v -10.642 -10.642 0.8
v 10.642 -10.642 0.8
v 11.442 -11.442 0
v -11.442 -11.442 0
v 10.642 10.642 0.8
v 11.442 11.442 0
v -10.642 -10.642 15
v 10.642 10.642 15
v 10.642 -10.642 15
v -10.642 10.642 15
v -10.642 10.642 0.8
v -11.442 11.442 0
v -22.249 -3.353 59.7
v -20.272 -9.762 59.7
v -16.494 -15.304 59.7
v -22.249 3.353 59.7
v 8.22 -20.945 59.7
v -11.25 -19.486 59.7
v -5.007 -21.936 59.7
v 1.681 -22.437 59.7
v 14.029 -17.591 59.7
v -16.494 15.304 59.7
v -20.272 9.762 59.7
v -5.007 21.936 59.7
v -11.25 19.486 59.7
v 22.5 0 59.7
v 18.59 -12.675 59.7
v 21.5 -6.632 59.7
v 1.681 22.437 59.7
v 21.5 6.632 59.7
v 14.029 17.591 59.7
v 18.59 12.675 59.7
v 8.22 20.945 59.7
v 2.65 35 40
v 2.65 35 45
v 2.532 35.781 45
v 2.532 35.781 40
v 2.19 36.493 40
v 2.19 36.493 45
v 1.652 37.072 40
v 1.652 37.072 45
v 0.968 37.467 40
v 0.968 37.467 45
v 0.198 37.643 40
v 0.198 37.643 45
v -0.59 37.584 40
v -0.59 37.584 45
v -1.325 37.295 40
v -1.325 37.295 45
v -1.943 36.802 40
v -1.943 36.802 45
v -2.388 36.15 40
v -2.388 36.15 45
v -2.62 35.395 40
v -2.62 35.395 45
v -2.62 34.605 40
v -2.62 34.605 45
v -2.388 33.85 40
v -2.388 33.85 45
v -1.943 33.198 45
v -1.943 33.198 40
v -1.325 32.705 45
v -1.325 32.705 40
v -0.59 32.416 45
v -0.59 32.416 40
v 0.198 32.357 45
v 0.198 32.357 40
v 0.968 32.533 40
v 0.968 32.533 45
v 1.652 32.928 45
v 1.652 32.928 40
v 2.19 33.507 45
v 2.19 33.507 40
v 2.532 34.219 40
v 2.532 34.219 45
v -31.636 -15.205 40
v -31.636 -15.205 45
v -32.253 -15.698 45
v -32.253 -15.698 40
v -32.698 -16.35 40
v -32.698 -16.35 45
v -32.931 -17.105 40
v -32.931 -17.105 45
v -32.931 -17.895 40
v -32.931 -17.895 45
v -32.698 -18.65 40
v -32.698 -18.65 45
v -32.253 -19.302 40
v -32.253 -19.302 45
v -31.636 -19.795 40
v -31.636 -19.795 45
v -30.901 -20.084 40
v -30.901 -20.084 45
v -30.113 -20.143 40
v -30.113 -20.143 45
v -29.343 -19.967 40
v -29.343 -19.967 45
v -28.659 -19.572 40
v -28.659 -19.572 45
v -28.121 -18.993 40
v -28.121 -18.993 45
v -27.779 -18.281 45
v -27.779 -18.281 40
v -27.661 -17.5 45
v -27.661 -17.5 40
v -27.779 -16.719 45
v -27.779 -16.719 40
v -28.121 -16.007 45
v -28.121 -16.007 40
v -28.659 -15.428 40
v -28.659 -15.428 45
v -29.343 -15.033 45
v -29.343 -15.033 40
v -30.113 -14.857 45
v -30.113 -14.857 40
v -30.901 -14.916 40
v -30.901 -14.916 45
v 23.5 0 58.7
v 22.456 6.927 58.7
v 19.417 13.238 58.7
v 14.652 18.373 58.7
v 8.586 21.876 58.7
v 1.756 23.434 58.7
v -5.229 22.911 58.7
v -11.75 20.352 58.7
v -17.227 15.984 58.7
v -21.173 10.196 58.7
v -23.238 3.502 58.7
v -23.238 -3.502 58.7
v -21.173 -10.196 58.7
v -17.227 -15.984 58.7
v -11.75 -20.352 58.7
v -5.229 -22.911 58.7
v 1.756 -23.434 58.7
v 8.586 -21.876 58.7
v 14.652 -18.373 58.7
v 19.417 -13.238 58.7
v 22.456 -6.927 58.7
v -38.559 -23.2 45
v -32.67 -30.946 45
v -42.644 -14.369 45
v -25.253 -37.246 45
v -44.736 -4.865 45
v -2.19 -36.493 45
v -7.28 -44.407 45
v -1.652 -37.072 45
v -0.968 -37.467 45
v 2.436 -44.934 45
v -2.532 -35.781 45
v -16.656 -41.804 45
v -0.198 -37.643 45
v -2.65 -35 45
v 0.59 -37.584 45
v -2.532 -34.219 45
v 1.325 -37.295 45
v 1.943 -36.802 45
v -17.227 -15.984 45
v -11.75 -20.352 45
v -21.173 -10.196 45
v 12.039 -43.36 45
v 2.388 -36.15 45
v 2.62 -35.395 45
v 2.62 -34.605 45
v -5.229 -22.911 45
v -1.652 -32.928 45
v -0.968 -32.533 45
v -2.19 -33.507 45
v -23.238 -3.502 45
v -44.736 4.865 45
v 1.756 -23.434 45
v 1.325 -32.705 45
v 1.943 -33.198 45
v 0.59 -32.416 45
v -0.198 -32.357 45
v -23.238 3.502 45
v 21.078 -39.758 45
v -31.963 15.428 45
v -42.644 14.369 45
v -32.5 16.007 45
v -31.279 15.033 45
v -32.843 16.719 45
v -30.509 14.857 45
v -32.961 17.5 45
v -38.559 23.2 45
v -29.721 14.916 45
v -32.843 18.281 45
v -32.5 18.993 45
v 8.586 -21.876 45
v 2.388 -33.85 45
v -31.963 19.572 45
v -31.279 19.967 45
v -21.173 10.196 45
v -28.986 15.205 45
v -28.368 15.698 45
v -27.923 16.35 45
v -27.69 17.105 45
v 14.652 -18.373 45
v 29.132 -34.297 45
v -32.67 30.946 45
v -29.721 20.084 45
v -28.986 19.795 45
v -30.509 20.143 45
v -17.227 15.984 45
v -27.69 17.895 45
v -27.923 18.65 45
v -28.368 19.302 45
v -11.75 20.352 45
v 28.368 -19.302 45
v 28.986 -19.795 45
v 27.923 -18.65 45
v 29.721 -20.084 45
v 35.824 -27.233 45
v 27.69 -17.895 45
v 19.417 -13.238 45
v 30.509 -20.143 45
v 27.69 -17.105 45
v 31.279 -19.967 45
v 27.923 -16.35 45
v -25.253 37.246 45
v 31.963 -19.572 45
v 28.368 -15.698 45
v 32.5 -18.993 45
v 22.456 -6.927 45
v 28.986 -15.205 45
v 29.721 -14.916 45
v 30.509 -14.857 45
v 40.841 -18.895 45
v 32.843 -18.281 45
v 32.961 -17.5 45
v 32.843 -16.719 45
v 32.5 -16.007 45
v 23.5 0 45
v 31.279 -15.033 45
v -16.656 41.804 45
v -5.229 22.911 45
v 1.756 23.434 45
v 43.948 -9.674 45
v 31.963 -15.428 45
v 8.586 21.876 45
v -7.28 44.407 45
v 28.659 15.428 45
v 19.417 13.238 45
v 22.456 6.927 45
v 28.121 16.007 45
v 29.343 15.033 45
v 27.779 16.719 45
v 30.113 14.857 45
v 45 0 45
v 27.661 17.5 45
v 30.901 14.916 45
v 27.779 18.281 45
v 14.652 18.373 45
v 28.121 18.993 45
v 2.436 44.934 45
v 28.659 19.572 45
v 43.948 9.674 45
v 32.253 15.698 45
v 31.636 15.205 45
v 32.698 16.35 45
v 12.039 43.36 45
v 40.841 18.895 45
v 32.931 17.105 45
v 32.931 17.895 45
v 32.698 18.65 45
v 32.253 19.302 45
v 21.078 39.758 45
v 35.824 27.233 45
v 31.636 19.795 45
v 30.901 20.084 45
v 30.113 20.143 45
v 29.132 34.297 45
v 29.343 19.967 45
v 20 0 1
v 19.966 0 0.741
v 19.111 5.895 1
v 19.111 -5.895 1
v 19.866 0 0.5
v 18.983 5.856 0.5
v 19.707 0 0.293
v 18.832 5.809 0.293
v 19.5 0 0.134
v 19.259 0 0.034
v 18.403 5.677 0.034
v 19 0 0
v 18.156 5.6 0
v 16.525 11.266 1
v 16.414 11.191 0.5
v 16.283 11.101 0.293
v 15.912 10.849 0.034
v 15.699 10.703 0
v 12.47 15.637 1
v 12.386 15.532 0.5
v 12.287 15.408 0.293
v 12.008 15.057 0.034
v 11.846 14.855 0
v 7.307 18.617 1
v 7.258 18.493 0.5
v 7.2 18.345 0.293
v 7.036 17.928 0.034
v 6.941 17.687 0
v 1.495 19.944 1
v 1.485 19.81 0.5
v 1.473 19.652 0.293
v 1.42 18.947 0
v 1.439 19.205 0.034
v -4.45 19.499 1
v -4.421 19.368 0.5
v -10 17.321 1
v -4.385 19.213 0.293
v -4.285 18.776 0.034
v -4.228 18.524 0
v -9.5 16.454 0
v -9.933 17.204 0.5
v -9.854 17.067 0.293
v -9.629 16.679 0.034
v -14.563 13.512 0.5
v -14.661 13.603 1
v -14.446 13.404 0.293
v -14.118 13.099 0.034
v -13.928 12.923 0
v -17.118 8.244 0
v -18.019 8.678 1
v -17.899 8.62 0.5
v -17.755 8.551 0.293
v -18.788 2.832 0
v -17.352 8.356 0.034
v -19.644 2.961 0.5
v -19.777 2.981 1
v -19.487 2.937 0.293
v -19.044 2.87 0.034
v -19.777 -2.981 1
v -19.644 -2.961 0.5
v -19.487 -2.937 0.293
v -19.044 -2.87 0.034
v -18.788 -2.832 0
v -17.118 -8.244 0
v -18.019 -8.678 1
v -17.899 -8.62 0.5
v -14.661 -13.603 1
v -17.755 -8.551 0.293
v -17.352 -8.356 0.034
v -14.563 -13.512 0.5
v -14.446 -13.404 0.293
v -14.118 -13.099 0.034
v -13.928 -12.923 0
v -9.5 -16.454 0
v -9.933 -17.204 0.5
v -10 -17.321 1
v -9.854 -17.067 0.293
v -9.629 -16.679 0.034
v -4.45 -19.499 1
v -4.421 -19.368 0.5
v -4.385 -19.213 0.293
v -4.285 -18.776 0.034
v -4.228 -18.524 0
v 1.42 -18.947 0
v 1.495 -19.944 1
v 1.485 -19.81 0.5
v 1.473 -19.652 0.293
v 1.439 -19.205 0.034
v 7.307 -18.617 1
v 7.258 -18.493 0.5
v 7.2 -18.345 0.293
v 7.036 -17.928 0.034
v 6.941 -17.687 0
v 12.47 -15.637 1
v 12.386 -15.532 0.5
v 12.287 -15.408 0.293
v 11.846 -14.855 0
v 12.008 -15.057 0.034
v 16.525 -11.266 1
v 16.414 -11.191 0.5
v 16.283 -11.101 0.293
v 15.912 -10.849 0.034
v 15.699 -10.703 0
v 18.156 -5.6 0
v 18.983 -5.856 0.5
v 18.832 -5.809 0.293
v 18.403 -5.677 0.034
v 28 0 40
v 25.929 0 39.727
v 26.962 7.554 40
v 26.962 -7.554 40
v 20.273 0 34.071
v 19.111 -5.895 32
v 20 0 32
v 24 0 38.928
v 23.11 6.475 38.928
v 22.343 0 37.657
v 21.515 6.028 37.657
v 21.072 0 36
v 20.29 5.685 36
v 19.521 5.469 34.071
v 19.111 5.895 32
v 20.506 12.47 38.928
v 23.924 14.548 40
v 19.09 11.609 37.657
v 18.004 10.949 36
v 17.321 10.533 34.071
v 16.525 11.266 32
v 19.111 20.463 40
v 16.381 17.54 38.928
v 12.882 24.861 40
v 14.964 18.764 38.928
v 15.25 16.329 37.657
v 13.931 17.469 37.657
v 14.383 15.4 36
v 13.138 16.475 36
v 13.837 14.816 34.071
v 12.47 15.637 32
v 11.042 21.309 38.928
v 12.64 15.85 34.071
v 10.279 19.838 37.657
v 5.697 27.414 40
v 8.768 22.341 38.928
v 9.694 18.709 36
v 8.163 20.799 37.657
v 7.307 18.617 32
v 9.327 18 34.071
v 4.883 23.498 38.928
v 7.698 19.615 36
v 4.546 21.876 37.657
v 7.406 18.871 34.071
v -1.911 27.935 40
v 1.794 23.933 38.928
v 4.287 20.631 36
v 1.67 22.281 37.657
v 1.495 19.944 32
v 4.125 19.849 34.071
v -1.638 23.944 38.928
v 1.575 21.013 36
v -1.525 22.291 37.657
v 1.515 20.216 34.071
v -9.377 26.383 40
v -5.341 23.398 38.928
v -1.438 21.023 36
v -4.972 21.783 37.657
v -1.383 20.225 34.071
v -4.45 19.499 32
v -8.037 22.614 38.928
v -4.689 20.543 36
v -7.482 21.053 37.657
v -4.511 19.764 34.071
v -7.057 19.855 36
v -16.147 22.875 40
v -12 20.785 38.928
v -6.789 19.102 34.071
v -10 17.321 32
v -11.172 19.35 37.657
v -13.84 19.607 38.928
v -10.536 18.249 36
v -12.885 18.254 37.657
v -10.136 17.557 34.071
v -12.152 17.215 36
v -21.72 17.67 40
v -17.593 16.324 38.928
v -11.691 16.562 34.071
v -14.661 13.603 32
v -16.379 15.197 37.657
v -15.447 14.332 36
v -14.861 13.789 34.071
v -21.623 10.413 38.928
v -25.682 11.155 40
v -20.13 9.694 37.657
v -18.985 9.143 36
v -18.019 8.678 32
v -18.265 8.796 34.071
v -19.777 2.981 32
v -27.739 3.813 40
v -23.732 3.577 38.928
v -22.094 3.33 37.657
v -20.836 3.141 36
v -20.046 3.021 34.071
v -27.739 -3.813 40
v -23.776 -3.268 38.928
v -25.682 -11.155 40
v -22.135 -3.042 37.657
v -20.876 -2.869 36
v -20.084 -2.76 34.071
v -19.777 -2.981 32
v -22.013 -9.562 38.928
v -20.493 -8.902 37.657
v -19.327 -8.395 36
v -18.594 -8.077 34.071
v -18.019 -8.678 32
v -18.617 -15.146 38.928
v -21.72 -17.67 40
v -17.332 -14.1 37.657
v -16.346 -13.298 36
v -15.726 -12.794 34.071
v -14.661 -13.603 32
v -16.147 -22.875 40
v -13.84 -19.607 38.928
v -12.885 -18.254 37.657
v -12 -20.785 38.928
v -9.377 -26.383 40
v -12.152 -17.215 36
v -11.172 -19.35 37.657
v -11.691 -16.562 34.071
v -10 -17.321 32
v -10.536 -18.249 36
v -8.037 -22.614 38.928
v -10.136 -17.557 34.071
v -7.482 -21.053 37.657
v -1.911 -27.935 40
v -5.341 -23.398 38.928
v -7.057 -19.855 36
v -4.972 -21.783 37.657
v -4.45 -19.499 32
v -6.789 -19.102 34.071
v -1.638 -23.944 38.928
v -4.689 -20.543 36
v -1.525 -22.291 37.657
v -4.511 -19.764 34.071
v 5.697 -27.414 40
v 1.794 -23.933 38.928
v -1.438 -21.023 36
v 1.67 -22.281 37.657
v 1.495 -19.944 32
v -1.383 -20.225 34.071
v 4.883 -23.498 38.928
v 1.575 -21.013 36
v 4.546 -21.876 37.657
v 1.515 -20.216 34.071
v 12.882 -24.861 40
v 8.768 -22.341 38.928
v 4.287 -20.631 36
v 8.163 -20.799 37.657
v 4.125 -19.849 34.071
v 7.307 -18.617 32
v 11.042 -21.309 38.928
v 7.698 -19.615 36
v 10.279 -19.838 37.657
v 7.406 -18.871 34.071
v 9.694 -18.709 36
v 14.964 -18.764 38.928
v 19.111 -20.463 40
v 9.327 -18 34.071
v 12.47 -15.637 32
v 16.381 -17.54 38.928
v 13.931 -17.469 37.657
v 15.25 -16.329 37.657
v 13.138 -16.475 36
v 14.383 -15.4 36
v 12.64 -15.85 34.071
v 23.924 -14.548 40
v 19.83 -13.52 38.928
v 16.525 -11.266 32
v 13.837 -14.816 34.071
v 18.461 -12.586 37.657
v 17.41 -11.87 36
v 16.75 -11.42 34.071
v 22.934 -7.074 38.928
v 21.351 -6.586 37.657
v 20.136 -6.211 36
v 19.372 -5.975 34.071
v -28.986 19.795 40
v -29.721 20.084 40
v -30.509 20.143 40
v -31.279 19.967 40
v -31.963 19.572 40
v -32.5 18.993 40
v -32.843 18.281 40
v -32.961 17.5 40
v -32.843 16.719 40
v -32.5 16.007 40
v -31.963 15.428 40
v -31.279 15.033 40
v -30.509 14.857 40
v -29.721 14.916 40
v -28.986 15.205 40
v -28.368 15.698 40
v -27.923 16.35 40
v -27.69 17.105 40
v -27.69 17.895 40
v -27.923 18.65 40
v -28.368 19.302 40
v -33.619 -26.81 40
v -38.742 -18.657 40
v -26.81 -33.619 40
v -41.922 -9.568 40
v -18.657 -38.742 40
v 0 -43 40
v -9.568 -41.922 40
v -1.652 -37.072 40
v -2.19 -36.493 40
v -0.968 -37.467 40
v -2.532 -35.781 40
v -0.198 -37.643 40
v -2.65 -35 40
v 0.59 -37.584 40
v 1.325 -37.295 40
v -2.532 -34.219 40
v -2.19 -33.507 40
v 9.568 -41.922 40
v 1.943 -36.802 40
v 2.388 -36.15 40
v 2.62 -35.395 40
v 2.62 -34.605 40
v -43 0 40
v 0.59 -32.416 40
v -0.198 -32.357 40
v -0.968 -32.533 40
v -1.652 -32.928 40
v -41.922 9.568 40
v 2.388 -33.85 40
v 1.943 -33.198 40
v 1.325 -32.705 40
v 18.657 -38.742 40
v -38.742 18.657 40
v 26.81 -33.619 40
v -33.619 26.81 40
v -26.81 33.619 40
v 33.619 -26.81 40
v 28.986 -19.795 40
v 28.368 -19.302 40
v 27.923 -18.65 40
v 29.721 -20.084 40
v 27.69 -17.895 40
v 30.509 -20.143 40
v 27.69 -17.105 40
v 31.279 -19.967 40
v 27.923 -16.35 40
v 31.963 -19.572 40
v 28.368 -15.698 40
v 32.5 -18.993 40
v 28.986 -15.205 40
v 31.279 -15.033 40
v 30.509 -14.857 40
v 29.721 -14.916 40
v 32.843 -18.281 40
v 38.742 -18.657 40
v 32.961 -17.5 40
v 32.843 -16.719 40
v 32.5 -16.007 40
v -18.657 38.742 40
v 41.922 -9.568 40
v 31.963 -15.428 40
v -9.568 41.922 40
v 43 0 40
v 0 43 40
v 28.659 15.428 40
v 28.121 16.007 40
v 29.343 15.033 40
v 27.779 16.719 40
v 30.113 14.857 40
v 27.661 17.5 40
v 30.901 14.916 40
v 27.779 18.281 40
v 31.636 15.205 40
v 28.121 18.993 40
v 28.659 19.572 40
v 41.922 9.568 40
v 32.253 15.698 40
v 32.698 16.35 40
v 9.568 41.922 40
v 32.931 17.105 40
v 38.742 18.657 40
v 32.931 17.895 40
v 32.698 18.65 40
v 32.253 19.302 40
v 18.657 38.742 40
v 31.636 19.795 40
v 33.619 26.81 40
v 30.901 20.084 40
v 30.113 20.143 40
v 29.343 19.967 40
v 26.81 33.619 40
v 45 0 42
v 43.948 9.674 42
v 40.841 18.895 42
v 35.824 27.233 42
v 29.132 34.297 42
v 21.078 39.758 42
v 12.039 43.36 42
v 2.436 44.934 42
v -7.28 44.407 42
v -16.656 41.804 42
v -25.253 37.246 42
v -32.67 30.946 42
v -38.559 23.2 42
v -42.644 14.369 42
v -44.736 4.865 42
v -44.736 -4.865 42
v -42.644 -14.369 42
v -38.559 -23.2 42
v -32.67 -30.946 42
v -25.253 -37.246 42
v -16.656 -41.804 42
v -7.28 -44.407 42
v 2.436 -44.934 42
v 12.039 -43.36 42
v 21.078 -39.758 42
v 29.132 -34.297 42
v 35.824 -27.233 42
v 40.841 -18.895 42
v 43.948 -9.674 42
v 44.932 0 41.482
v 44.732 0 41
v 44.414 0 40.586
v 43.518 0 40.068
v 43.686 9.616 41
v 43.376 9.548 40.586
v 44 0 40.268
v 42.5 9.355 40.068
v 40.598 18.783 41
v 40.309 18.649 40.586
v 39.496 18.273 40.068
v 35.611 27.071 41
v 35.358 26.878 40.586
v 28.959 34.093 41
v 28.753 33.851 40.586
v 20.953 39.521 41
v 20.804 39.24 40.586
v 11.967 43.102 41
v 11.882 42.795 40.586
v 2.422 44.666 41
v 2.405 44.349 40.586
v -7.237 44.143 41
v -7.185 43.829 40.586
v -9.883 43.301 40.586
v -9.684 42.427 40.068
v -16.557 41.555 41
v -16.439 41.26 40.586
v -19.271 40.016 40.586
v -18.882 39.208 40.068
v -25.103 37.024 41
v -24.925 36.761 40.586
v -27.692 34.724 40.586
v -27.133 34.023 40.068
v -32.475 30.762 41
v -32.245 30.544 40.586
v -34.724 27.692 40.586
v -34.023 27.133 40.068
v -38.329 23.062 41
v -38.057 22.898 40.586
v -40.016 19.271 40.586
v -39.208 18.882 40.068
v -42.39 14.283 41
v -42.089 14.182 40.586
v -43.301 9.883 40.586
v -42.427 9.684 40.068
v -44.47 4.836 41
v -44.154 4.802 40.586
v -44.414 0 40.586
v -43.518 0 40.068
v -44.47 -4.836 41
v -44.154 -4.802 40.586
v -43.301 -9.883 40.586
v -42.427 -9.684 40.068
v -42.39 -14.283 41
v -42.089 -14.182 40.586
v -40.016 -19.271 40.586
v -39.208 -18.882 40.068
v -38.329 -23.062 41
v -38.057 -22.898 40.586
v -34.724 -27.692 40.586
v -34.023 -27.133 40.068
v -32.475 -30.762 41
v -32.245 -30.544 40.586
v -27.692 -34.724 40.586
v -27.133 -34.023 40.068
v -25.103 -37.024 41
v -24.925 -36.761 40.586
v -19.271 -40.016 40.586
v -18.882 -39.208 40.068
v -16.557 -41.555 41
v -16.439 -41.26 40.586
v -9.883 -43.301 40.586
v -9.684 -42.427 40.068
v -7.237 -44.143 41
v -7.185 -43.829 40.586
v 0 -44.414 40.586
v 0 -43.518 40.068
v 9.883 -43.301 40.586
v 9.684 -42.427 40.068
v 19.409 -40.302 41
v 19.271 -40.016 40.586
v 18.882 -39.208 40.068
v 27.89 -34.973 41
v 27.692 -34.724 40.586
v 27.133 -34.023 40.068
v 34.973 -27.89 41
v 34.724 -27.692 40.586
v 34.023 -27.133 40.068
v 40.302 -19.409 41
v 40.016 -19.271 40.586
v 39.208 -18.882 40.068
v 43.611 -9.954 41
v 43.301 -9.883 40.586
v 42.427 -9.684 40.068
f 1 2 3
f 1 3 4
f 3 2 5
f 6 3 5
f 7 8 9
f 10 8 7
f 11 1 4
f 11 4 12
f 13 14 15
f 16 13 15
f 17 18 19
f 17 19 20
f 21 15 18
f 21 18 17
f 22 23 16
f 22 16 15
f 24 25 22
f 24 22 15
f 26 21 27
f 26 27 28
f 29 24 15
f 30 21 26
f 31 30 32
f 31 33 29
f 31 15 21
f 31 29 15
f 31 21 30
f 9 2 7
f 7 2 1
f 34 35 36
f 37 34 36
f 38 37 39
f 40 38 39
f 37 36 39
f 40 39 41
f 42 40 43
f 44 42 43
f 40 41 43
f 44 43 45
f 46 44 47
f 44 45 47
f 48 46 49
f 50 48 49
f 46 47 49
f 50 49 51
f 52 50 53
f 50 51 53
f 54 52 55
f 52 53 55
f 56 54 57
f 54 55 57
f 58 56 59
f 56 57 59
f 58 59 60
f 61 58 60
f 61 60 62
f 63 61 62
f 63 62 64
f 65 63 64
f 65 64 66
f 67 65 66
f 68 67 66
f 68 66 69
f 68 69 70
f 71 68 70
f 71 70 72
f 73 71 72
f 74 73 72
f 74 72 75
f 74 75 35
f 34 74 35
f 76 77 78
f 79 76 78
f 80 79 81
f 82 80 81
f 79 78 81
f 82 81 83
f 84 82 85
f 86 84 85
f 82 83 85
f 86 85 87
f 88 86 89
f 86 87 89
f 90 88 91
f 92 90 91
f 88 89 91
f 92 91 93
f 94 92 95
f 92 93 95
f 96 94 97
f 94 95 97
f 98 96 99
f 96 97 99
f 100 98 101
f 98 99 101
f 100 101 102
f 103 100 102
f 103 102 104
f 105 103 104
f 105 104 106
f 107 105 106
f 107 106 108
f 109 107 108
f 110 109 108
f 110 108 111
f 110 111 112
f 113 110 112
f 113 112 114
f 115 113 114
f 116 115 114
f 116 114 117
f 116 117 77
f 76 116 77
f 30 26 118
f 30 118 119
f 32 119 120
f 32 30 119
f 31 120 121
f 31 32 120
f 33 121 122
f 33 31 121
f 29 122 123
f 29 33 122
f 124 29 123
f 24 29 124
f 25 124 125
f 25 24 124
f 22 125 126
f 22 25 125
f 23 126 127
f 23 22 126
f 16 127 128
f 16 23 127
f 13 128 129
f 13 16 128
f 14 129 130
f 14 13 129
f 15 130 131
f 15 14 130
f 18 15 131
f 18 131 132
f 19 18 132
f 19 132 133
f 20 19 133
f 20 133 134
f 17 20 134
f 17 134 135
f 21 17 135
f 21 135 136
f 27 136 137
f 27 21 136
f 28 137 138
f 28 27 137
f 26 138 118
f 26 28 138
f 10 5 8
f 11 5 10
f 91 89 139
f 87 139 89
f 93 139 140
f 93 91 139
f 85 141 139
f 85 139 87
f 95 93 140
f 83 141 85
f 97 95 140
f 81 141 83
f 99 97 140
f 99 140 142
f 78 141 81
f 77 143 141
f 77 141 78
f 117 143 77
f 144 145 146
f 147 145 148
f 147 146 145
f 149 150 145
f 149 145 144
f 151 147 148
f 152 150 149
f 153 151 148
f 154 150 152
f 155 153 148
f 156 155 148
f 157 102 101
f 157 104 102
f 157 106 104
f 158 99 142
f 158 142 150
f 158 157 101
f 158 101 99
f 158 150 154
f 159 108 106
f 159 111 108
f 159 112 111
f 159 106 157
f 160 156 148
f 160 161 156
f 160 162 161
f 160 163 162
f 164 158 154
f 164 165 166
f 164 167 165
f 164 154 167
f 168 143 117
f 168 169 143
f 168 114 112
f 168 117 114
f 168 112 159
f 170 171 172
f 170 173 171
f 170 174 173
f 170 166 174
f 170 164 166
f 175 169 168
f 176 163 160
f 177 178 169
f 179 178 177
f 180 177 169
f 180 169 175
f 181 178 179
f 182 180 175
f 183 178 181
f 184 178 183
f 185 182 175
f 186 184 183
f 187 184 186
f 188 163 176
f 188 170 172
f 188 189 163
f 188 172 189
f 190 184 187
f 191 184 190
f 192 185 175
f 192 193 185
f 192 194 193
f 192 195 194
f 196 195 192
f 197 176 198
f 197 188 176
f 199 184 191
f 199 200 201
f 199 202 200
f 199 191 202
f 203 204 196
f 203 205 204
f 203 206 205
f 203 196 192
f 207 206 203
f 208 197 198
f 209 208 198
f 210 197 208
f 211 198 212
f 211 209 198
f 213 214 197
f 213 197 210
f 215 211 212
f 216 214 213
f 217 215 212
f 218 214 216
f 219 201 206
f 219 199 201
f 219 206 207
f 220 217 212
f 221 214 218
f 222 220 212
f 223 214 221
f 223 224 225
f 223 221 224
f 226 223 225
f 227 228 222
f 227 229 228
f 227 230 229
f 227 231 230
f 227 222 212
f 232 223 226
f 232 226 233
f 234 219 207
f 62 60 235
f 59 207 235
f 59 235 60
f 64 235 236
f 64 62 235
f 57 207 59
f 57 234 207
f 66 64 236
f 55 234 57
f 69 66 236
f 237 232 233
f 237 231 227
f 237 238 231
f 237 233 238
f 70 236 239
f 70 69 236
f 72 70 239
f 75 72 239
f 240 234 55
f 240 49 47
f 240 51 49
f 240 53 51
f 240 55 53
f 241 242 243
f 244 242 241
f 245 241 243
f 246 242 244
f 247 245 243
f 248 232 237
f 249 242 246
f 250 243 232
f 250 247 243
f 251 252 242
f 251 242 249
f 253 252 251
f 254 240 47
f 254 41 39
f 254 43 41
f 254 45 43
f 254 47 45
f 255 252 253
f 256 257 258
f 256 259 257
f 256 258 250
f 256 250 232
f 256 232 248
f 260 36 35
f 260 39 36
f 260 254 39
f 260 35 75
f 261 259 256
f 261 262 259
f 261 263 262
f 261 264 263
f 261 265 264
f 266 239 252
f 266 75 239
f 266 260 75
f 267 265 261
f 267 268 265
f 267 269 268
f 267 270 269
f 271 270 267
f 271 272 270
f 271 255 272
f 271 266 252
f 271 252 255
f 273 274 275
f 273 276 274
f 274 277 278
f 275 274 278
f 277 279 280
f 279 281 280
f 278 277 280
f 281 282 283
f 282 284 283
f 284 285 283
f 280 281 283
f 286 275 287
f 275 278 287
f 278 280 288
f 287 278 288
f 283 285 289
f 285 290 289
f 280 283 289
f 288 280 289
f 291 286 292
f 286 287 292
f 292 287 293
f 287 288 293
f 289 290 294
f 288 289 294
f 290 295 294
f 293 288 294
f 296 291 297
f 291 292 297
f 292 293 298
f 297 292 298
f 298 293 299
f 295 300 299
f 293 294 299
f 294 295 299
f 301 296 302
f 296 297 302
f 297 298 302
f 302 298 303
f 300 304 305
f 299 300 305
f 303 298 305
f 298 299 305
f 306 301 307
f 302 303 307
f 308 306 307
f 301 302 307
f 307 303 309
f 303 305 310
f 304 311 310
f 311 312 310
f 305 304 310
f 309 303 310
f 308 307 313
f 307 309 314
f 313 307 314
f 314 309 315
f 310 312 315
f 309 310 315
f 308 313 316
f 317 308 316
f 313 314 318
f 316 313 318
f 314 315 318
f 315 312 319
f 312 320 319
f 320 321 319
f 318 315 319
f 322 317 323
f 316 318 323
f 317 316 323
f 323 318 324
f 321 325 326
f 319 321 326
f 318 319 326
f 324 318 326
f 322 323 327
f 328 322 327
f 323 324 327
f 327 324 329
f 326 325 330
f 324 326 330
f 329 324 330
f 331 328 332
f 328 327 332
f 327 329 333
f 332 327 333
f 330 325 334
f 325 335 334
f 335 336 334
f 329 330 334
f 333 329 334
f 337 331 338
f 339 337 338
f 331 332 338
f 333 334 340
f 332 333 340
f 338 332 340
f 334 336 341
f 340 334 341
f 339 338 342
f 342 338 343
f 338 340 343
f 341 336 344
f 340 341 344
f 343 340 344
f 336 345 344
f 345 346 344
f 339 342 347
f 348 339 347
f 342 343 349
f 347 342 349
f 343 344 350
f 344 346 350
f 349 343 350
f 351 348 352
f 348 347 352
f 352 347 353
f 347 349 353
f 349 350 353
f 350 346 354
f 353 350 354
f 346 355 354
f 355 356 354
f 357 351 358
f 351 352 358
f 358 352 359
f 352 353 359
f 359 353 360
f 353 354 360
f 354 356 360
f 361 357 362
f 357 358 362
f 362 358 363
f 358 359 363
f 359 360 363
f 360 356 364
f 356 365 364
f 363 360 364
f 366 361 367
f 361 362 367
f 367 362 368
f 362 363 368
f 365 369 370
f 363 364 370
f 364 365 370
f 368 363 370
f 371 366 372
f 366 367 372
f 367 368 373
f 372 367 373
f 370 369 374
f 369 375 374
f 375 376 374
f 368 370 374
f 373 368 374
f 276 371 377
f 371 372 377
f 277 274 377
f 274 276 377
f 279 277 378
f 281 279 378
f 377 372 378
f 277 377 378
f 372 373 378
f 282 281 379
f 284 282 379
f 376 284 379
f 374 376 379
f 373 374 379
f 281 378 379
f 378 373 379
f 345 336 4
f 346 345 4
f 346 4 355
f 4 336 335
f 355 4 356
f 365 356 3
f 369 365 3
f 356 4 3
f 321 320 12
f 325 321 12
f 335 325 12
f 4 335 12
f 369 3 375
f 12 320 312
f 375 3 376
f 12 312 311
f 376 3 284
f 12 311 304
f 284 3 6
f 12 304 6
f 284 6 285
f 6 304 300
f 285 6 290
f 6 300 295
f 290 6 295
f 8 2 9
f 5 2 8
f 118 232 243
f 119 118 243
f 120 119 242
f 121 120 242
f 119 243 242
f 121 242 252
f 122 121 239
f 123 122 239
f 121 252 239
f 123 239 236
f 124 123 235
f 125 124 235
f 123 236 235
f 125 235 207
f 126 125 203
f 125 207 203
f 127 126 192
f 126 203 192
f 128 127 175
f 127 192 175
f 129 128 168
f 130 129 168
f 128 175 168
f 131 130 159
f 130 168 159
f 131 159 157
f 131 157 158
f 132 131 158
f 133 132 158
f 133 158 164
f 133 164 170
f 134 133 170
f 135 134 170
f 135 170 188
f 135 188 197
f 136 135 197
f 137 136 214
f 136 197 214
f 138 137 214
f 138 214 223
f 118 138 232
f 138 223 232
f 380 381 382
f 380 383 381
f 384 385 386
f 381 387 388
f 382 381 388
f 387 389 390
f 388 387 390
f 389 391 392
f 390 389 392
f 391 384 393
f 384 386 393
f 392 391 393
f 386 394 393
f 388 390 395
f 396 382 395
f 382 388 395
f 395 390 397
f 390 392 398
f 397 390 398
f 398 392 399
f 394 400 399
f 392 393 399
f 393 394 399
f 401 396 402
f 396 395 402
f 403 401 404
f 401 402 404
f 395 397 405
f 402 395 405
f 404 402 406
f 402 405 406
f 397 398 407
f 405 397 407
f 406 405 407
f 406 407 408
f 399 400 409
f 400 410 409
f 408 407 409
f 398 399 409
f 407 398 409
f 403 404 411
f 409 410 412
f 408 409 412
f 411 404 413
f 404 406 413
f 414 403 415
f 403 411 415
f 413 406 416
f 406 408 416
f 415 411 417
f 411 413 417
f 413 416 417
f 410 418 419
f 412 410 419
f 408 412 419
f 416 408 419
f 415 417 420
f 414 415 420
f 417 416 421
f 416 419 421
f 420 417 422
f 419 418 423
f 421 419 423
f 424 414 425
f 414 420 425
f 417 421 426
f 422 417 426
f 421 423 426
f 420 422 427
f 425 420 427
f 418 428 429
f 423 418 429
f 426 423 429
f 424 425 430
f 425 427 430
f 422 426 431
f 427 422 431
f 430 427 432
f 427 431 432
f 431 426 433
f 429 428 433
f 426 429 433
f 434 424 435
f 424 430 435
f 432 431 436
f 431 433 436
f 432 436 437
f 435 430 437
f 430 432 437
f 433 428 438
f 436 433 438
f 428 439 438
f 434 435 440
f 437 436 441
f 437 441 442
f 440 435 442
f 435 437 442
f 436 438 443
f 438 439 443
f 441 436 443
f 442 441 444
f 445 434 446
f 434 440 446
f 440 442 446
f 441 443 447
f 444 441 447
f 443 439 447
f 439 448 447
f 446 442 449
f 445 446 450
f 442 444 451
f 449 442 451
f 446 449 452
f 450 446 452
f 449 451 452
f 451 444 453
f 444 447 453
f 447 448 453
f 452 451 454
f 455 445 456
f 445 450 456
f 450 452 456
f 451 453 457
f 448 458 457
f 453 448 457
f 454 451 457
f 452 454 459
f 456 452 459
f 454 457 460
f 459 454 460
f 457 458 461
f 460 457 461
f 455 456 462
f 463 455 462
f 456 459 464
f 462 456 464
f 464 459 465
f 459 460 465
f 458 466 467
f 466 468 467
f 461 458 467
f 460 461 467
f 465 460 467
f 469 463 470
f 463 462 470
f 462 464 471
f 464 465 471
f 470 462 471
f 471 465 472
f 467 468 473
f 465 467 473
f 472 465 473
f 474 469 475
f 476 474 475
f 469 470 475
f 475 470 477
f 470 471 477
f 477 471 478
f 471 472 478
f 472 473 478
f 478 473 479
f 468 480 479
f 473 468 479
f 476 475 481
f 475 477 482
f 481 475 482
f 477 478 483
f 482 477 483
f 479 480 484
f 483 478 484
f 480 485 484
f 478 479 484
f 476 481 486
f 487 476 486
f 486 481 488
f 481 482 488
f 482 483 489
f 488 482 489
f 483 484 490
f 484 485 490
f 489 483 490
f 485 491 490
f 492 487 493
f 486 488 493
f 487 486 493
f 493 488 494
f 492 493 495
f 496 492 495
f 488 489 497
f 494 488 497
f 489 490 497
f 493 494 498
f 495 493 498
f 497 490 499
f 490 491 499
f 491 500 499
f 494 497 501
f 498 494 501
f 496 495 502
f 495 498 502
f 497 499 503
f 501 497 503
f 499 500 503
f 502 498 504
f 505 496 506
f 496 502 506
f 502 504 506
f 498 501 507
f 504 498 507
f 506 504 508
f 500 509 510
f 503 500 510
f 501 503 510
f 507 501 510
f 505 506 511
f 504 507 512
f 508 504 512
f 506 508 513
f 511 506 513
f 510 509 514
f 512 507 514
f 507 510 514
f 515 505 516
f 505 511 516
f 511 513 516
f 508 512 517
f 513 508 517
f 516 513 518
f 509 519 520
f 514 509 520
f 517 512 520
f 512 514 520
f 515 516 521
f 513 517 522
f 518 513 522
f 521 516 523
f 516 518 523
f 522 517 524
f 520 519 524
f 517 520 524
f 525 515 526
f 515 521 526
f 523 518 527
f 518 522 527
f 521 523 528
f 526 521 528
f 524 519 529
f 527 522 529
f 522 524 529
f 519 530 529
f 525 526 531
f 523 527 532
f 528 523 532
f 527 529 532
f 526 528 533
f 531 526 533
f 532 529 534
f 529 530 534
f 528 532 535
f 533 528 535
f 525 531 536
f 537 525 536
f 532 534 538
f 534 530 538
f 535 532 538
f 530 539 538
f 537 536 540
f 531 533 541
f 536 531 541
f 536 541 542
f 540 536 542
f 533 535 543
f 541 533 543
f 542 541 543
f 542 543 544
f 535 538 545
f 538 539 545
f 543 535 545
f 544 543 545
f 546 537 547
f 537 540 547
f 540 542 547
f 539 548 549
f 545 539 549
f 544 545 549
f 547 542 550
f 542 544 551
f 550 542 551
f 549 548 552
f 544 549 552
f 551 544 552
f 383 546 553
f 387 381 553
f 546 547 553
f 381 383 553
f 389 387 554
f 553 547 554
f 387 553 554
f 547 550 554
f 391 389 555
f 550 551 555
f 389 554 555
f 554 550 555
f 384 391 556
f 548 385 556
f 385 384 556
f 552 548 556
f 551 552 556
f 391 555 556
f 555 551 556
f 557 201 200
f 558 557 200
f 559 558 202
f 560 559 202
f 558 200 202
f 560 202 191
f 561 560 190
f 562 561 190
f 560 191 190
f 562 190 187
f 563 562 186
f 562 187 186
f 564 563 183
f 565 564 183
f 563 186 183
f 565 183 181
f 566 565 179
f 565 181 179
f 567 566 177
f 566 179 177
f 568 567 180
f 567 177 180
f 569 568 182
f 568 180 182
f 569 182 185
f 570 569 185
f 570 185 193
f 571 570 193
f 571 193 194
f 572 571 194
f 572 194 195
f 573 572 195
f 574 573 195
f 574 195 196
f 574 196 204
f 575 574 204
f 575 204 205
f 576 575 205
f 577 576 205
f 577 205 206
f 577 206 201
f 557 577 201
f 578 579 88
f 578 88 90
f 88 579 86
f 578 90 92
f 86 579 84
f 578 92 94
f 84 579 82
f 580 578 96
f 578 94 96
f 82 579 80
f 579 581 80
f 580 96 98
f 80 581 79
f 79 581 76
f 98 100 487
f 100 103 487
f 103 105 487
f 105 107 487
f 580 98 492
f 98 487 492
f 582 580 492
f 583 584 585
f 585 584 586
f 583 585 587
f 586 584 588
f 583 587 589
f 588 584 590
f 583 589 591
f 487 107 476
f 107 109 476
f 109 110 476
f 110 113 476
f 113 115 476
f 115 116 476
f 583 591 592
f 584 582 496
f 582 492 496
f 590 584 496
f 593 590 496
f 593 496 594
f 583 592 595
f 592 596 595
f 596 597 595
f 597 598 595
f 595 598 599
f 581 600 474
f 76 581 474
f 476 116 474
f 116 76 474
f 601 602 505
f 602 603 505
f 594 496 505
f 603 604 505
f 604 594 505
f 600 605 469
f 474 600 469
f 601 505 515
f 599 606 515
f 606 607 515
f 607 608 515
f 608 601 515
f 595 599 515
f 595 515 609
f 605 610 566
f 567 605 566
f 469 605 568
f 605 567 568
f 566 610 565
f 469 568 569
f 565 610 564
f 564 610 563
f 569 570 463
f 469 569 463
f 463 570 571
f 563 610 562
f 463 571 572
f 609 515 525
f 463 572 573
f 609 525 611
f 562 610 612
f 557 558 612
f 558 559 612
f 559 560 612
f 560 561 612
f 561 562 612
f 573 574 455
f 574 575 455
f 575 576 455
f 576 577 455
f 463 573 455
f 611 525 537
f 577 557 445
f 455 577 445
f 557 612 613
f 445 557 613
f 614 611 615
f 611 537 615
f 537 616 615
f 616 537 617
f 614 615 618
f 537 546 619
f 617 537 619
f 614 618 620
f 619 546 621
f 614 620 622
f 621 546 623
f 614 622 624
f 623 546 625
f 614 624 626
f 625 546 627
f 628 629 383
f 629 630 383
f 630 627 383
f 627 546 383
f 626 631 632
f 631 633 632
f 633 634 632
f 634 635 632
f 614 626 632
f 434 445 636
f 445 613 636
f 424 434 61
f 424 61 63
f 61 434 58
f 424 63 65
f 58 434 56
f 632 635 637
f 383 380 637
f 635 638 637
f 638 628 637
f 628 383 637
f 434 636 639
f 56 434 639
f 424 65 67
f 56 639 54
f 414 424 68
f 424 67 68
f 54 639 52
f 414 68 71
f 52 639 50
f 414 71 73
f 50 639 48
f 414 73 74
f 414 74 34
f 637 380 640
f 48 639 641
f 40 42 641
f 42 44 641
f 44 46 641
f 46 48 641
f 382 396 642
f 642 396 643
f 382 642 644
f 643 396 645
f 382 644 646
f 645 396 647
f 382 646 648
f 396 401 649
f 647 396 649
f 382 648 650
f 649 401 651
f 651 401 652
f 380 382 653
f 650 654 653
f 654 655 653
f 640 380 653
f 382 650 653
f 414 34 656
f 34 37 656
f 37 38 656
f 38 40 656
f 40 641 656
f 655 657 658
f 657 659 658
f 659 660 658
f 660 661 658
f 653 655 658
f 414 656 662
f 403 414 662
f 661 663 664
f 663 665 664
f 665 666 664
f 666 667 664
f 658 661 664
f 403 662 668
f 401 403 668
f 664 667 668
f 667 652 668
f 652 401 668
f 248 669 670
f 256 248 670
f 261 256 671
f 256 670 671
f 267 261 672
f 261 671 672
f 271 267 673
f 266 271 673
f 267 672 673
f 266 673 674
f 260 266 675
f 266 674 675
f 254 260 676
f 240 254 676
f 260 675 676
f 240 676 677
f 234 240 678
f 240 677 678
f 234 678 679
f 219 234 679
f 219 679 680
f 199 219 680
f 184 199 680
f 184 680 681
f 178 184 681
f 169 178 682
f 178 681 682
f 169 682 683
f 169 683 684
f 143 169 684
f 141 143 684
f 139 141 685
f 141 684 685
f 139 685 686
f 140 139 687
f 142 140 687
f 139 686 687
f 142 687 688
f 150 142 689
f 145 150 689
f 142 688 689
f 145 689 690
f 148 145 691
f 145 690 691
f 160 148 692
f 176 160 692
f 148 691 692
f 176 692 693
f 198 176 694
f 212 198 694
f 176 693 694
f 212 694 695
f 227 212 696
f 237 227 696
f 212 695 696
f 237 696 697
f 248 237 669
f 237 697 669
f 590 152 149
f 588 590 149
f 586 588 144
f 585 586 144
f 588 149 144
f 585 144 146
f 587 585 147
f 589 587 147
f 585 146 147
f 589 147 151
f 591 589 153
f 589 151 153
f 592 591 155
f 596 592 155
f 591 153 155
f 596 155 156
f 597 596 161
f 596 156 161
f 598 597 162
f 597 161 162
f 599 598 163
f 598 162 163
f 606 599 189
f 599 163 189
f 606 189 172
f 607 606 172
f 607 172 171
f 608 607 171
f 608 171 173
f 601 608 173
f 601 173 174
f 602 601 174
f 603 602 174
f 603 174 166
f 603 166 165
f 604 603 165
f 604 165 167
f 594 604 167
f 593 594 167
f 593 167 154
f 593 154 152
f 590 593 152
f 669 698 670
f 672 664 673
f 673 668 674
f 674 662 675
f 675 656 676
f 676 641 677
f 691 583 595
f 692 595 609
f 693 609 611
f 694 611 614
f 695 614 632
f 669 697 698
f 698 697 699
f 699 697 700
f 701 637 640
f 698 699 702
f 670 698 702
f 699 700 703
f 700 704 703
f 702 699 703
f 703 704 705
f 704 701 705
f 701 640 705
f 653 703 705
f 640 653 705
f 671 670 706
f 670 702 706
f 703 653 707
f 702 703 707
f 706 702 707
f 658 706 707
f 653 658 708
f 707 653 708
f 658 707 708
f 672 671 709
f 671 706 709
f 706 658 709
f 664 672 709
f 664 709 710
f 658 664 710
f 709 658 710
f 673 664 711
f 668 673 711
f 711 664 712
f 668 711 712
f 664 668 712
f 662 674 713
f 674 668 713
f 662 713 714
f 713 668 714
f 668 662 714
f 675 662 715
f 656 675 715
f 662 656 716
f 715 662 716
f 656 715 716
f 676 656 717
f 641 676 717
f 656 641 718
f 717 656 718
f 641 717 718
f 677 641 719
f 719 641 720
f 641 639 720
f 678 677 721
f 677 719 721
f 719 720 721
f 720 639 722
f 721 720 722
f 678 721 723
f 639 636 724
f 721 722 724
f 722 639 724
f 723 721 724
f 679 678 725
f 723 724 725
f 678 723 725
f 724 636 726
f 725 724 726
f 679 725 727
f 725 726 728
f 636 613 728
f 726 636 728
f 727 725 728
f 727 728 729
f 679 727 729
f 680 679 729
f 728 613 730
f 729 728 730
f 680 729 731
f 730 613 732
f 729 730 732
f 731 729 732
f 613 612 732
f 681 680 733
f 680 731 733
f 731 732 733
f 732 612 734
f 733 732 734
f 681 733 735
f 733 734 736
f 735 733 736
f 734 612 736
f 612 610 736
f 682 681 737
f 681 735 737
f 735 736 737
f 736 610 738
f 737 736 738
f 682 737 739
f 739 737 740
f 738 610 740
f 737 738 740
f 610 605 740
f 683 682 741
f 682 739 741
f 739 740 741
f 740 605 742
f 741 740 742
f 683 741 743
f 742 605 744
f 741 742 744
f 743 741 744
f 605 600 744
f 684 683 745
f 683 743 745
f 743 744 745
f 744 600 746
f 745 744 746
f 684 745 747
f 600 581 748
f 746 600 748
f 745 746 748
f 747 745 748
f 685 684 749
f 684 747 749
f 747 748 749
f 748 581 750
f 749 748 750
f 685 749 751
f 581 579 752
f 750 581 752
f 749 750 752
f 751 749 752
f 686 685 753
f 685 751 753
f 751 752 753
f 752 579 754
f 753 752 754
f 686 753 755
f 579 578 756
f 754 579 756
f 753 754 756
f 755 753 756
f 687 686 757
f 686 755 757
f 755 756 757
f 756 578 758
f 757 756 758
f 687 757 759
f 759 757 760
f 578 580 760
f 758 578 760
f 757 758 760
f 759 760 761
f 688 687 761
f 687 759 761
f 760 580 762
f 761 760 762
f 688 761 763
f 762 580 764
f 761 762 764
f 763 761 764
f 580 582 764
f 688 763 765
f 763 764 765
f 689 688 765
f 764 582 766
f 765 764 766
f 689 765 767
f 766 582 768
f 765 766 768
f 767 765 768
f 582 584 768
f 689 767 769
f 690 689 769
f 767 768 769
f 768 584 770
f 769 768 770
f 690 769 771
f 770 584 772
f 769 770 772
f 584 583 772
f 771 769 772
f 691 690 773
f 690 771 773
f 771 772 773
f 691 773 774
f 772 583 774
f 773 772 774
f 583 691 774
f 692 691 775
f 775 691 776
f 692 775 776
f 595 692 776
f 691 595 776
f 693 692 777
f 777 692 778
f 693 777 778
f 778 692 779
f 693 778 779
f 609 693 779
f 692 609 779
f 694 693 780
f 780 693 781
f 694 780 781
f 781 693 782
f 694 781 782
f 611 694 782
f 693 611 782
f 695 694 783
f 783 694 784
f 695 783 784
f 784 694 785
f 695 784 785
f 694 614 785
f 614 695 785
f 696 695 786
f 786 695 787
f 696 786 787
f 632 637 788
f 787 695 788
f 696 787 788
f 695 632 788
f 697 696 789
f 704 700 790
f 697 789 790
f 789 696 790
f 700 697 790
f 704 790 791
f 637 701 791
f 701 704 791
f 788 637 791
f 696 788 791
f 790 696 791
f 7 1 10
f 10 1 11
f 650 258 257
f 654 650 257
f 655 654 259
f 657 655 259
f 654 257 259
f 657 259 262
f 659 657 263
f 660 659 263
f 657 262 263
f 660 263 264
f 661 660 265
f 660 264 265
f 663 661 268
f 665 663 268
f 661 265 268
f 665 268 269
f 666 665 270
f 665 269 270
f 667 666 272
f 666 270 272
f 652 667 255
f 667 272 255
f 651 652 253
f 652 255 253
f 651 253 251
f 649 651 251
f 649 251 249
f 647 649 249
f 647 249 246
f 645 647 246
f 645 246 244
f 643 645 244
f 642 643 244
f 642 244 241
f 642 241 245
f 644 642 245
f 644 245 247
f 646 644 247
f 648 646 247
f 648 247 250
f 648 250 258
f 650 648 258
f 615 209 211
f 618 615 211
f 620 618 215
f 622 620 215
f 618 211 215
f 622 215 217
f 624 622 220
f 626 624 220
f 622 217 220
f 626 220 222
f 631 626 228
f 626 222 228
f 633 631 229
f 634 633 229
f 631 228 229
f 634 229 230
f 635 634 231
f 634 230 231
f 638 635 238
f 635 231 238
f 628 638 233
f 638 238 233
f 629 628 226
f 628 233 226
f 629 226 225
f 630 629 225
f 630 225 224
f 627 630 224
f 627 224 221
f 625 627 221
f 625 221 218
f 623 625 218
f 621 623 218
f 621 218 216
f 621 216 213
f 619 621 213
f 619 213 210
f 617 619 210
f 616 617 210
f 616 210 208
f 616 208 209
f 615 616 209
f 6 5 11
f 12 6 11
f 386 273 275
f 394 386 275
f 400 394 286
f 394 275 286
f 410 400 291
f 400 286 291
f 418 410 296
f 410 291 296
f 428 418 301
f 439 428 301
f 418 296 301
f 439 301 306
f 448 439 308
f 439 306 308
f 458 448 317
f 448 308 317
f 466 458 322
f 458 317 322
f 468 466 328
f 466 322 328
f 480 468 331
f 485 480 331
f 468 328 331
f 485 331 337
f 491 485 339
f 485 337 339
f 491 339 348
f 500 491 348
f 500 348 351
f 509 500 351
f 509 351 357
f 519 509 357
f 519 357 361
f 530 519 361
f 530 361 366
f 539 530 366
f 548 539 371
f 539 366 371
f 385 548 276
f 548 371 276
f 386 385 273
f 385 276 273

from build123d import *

# Parameters (mm, degrees)
SKETCH1_R           = 20
BOSS_EXTRUDE1_DEPTH = 40
SKETCH2_W           = 21.283914114
SKETCH2_H           = 21.283914114
CUT_EXTRUDE1_DEPTH  = 15
CHAMFER1_SIZE       = 0.8
SKETCH3_R           = 45
BOSS_EXTRUDE2_DEPTH = 5
SKETCH4_R           = 23.5
BOSS_EXTRUDE3_DEPTH = 14.7
CHAMFER2_SIZE       = 1
FILLET1_R           = 2
FILLET2_R           = 8
SKETCH5_R           = 2.65
CUT_EXTRUDE2_DEPTH  = 78.942286398
CIRPATTERN1_COUNT   = 6
FILLET3_R           = 1


with BuildPart() as part:
    # Sketch1 → Boss-Extrude1 (new body)
    with BuildSketch(Plane.XY):
        Circle(SKETCH1_R)
    extrude(amount=BOSS_EXTRUDE1_DEPTH)

    # Sketch2 → Cut-Extrude1 (cut)
    with BuildSketch(Plane(origin=(0, 0, 0), x_dir=(-1, 0, 0), z_dir=(0, 0, -1))):
        Rectangle(SKETCH2_W, SKETCH2_H)
    extrude(amount=-CUT_EXTRUDE1_DEPTH, mode=Mode.SUBTRACT)

    # Chamfer1
    chamfer1_edges = [part.edges().sort_by_distance(p)[0] for p in [
        (0, -10.641957057, 0),
        (-10.641957057, 0, 0),
        (0, 10.641957057, 0),
        (10.641957057, 0, 0),
    ]]
    chamfer(chamfer1_edges, length=CHAMFER1_SIZE)

    # Sketch3 → Boss-Extrude2 (add)
    with BuildSketch(Plane.XY.offset(40)):
        Circle(SKETCH3_R)
    extrude(amount=BOSS_EXTRUDE2_DEPTH)

    # Sketch4 → Boss-Extrude3 (add)
    with BuildSketch(Plane.XY.offset(45)):
        Circle(SKETCH4_R)
    extrude(amount=BOSS_EXTRUDE3_DEPTH)

    # Chamfer2
    chamfer2_edges = [part.edges().sort_by_distance(p)[0] for p in [
        (-23.5, 0, 59.7),
    ]]
    chamfer(chamfer2_edges, length=CHAMFER2_SIZE)

    # Fillet1
    fillet1_edges = [part.edges().sort_by_distance(p)[0] for p in [
        (-45, 0, 40),
    ]]
    fillet(fillet1_edges, radius=FILLET1_R)

    # Fillet2
    fillet2_edges = [part.edges().sort_by_distance(p)[0] for p in [
        (-20, 0, 40),
    ]]
    fillet(fillet2_edges, radius=FILLET2_R)

    # Sketch5 → Cut-Extrude2 (cut, through all)
    with BuildSketch(Plane.XY.offset(45)):
        with Locations((0, 35)):
            Circle(SKETCH5_R)
    cut_extrude2 = extrude(amount=-CUT_EXTRUDE2_DEPTH, mode=Mode.SUBTRACT)

    # CirPattern1: Cut-Extrude2 ×6 about axis
    cirpattern1_axis = Axis((0, 0, 0), (0, 0, 1))
    for i in range(1, CIRPATTERN1_COUNT):
        add(cut_extrude2.rotate(cirpattern1_axis, i * 360 / CIRPATTERN1_COUNT), mode=Mode.SUBTRACT)

    # Fillet3
    fillet3_edges = [part.edges().sort_by_distance(p)[0] for p in [
        (-20, 0, 0),
    ]]
    fillet(fillet3_edges, radius=FILLET3_R)


solid = part.part
